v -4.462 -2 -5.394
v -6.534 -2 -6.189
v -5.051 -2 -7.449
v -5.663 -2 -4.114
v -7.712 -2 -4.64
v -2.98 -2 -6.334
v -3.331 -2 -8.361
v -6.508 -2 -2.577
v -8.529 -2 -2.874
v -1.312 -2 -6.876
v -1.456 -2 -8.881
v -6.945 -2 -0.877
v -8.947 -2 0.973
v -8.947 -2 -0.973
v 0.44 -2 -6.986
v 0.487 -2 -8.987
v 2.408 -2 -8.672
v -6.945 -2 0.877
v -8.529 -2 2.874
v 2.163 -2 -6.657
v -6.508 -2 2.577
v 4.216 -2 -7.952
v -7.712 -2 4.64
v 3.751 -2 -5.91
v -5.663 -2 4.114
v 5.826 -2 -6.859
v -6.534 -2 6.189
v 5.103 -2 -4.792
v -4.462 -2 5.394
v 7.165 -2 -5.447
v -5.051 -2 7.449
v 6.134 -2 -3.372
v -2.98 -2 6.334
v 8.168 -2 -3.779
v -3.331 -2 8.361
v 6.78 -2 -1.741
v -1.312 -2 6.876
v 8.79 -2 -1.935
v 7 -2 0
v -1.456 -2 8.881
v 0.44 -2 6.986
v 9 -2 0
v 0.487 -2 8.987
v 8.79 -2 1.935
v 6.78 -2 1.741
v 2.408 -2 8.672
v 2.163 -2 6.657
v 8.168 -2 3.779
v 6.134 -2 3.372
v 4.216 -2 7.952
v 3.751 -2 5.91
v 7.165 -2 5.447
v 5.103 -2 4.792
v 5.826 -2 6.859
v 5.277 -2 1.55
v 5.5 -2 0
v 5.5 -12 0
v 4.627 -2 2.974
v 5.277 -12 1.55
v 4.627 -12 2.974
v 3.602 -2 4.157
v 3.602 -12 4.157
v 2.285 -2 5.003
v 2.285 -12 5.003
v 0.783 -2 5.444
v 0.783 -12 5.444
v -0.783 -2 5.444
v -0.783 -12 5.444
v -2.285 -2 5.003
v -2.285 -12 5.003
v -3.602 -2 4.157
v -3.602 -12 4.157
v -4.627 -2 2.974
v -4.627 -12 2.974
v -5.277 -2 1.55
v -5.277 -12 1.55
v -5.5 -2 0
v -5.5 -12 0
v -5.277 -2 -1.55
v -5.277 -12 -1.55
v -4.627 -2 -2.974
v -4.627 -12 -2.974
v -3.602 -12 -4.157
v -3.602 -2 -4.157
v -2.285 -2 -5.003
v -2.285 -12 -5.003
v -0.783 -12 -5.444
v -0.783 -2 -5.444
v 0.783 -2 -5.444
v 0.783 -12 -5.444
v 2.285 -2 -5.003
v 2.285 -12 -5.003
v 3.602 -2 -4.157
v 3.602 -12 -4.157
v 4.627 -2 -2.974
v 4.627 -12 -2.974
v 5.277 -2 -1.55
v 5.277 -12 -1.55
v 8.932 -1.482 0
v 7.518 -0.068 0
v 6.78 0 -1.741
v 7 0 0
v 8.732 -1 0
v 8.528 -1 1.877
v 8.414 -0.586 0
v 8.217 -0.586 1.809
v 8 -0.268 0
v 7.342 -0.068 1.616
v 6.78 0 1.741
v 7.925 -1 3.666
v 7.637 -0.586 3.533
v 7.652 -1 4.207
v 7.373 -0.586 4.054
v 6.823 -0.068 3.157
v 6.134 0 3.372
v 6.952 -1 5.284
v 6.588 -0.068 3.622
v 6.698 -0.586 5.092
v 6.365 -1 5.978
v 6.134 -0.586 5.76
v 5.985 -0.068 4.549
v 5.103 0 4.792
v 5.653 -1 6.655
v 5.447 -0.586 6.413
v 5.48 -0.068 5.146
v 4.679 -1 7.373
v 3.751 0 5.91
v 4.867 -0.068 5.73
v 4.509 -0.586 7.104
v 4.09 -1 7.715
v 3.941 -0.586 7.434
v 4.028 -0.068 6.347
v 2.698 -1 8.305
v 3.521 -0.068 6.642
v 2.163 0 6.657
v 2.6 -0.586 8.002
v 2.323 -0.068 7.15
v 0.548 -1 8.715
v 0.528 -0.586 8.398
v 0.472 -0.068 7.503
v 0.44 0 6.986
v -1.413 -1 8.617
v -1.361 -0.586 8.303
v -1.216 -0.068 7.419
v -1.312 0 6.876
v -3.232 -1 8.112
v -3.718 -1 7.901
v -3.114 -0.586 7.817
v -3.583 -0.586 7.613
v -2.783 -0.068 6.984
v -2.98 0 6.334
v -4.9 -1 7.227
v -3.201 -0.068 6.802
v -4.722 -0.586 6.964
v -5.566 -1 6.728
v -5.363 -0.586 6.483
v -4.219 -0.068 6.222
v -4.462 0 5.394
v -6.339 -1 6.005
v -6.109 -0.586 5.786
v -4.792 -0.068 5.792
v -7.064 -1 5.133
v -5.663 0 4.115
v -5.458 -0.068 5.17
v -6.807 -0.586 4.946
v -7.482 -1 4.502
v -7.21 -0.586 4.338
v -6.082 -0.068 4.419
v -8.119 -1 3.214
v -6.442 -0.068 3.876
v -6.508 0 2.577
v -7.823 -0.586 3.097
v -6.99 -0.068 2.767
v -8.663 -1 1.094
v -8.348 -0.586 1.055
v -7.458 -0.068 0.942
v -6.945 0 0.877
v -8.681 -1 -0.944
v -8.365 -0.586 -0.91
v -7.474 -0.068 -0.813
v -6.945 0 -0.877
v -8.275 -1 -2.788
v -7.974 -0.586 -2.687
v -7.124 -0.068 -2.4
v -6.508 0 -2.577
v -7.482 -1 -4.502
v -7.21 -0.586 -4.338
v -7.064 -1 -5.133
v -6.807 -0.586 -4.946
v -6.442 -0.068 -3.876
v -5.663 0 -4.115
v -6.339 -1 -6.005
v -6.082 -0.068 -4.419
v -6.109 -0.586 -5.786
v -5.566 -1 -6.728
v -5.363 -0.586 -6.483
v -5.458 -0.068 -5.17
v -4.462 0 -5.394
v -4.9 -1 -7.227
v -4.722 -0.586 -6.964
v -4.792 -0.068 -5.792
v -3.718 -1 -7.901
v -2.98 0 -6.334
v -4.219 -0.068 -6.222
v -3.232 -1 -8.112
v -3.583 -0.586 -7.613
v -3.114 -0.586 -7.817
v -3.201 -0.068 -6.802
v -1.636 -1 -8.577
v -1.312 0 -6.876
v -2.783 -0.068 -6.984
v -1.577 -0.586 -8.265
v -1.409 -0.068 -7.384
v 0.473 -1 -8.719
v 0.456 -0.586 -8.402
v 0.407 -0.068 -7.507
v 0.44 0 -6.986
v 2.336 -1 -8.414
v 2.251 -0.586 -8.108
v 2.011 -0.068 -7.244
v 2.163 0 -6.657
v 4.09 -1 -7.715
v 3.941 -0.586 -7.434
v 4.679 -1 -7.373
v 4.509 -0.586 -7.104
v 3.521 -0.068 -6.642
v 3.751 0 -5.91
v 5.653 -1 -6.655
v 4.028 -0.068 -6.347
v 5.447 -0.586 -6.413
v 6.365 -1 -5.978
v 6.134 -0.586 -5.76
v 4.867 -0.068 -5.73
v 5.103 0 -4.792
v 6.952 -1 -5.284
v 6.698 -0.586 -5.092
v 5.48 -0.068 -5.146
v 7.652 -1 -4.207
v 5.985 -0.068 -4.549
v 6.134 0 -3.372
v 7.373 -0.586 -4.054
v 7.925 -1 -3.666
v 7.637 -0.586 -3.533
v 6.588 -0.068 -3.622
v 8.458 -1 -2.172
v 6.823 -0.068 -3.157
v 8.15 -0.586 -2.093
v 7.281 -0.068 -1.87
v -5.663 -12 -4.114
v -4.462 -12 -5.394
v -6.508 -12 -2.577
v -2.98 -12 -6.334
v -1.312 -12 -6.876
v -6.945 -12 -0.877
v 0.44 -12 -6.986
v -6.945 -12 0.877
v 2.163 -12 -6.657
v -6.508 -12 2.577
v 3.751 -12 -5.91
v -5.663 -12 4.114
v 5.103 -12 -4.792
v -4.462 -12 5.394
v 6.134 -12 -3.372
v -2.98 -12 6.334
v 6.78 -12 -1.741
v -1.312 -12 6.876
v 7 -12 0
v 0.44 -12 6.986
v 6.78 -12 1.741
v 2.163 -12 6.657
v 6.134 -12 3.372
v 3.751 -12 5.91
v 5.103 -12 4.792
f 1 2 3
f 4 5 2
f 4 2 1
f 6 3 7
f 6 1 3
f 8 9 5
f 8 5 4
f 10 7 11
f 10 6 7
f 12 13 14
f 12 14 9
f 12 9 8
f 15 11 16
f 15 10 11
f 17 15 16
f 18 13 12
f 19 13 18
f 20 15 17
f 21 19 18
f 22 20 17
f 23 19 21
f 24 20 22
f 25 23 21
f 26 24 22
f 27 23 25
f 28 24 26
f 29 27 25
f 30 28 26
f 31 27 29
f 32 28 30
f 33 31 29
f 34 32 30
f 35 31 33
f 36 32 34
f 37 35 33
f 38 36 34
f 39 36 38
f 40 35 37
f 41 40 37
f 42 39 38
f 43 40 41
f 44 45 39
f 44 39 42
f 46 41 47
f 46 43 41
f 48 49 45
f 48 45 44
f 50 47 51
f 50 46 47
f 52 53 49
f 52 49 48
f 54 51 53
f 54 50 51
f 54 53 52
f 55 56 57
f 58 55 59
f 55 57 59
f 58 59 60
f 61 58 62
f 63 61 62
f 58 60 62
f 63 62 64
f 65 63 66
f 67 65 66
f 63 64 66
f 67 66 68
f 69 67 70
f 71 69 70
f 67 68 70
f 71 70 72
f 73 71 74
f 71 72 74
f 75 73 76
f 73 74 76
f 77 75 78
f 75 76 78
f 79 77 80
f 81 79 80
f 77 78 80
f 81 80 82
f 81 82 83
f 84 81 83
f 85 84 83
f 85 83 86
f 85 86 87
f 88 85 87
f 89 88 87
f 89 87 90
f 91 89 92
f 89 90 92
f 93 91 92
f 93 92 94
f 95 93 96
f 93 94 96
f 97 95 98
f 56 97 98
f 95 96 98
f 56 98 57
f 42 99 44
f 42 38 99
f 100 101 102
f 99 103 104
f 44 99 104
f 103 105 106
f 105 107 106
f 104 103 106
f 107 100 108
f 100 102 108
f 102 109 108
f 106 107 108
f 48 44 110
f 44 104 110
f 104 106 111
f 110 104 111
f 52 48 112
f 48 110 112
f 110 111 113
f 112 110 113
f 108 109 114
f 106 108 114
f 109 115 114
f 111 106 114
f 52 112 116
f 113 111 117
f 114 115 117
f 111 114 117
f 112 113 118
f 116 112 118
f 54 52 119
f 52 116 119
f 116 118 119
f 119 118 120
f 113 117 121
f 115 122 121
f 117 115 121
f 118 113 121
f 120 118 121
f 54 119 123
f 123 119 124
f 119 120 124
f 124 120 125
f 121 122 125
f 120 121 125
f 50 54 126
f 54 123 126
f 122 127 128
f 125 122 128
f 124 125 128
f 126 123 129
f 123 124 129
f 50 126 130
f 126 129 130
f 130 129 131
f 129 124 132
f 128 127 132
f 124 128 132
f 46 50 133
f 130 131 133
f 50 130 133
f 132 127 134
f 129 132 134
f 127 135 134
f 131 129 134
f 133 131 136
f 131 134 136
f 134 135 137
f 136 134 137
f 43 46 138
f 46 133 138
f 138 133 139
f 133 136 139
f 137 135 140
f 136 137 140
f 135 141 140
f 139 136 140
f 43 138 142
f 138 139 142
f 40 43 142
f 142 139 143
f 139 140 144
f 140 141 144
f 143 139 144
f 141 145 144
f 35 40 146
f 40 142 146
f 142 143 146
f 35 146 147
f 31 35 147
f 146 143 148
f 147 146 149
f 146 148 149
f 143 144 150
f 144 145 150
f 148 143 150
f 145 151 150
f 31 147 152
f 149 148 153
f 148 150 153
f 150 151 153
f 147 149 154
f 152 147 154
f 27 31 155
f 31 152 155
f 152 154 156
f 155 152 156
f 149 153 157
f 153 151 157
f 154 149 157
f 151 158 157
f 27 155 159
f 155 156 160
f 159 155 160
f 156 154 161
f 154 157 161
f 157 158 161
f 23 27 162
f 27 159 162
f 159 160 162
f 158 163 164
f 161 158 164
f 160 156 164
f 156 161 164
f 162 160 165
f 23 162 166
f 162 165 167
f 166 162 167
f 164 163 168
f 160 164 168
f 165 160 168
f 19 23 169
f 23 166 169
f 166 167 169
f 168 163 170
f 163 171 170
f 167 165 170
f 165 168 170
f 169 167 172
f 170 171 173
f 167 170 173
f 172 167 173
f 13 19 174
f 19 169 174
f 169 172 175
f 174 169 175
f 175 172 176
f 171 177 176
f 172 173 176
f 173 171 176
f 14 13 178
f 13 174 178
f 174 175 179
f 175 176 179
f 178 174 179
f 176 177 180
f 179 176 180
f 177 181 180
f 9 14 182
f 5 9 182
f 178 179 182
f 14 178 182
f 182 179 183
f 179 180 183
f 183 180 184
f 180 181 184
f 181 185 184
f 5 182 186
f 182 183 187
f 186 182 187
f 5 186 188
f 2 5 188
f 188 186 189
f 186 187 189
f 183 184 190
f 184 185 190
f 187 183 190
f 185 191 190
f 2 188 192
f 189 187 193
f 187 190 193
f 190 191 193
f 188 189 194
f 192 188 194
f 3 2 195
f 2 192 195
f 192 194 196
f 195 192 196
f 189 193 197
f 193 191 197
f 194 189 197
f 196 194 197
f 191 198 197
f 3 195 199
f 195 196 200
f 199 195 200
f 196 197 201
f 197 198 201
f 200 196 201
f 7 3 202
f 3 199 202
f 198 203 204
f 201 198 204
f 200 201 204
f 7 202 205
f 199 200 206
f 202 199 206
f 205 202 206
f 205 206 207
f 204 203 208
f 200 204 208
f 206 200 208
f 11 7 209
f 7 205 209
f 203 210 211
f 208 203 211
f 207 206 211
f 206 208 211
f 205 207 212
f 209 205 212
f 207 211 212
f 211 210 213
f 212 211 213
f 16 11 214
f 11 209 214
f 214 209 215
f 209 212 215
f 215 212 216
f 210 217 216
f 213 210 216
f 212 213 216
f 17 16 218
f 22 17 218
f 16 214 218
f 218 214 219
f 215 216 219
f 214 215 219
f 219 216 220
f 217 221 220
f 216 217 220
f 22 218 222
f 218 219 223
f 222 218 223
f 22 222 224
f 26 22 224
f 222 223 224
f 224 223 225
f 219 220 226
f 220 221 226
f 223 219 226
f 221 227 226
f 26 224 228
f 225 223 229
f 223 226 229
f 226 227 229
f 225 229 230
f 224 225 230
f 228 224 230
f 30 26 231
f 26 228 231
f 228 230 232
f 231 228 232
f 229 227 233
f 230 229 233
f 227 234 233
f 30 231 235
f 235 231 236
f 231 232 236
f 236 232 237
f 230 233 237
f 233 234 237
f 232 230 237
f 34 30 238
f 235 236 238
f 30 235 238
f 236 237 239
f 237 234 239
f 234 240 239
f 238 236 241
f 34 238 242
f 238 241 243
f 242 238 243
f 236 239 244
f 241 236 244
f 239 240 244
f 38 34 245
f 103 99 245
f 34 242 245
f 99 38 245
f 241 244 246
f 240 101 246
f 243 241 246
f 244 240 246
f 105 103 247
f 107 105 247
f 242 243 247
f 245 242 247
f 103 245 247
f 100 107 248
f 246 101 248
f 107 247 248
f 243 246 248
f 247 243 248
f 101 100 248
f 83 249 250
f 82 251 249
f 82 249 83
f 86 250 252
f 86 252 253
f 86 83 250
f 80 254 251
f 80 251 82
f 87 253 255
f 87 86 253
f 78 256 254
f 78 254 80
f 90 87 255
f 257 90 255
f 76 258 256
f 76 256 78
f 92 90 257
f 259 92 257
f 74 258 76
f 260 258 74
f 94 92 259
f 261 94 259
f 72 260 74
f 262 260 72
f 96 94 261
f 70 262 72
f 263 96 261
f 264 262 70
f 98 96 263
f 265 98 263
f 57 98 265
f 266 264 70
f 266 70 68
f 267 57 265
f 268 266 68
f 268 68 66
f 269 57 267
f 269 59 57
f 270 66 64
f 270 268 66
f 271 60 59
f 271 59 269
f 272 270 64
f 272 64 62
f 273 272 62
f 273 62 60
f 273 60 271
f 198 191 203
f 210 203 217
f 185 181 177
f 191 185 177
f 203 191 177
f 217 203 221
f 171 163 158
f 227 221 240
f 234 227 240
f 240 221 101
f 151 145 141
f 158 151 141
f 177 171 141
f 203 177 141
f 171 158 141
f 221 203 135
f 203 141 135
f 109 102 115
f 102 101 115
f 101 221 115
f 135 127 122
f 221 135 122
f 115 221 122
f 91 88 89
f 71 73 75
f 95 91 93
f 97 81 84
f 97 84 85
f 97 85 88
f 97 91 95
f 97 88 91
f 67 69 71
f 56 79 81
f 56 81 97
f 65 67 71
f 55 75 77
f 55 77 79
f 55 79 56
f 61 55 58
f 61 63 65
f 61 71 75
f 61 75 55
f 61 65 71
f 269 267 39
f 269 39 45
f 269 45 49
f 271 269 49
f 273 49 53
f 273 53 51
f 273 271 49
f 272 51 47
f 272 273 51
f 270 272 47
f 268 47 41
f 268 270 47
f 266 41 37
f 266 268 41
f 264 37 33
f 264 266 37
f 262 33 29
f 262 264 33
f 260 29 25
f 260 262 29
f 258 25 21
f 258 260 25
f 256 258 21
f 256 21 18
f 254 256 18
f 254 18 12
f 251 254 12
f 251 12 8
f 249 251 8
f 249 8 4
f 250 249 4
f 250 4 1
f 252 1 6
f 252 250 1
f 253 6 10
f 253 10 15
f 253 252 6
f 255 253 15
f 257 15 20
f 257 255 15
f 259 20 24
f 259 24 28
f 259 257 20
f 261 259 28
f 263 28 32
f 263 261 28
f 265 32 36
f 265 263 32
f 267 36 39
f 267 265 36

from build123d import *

# Parameters (mm, degrees)
F0_R     = 9
F1_DEPTH = 12
F2_R     = 9
F2_R_2   = 7
F3_DEPTH = 10
F4_R     = 5.5
F5_DEPTH = 10
F6_R     = 1.99999


# Not quite as in the source:
# - a fillet or chamfer is up to 0.001 mm smaller than in the source, because OpenCascade refuses the exact size


with BuildPart() as f1:
    # F0 (on Front) → F1 (new body)
    with BuildSketch(Plane.XZ):
        Circle(F0_R)
    extrude(amount=F1_DEPTH)

    # F2 (on face) → F3 (cut)
    with BuildSketch(Plane.XZ.offset(12)):
        Circle(F2_R)
        Circle(F2_R_2, mode=Mode.SUBTRACT)
    extrude(amount=-F3_DEPTH, mode=Mode.SUBTRACT)

    # F4 (on face) → F5 (cut)
    with BuildSketch(Plane.XZ.offset(12)):
        Circle(F4_R)
    extrude(amount=-F5_DEPTH, mode=Mode.SUBTRACT)

    # F6 (radius 2 in the source; OpenCascade refuses exactly that, so slightly less here)
    f6_edges = [f1.edges().sort_by_distance(p)[0] for p in [
        (-9, 0, 0),
    ]]
    fillet(f6_edges, radius=F6_R)


solid = f1.part
